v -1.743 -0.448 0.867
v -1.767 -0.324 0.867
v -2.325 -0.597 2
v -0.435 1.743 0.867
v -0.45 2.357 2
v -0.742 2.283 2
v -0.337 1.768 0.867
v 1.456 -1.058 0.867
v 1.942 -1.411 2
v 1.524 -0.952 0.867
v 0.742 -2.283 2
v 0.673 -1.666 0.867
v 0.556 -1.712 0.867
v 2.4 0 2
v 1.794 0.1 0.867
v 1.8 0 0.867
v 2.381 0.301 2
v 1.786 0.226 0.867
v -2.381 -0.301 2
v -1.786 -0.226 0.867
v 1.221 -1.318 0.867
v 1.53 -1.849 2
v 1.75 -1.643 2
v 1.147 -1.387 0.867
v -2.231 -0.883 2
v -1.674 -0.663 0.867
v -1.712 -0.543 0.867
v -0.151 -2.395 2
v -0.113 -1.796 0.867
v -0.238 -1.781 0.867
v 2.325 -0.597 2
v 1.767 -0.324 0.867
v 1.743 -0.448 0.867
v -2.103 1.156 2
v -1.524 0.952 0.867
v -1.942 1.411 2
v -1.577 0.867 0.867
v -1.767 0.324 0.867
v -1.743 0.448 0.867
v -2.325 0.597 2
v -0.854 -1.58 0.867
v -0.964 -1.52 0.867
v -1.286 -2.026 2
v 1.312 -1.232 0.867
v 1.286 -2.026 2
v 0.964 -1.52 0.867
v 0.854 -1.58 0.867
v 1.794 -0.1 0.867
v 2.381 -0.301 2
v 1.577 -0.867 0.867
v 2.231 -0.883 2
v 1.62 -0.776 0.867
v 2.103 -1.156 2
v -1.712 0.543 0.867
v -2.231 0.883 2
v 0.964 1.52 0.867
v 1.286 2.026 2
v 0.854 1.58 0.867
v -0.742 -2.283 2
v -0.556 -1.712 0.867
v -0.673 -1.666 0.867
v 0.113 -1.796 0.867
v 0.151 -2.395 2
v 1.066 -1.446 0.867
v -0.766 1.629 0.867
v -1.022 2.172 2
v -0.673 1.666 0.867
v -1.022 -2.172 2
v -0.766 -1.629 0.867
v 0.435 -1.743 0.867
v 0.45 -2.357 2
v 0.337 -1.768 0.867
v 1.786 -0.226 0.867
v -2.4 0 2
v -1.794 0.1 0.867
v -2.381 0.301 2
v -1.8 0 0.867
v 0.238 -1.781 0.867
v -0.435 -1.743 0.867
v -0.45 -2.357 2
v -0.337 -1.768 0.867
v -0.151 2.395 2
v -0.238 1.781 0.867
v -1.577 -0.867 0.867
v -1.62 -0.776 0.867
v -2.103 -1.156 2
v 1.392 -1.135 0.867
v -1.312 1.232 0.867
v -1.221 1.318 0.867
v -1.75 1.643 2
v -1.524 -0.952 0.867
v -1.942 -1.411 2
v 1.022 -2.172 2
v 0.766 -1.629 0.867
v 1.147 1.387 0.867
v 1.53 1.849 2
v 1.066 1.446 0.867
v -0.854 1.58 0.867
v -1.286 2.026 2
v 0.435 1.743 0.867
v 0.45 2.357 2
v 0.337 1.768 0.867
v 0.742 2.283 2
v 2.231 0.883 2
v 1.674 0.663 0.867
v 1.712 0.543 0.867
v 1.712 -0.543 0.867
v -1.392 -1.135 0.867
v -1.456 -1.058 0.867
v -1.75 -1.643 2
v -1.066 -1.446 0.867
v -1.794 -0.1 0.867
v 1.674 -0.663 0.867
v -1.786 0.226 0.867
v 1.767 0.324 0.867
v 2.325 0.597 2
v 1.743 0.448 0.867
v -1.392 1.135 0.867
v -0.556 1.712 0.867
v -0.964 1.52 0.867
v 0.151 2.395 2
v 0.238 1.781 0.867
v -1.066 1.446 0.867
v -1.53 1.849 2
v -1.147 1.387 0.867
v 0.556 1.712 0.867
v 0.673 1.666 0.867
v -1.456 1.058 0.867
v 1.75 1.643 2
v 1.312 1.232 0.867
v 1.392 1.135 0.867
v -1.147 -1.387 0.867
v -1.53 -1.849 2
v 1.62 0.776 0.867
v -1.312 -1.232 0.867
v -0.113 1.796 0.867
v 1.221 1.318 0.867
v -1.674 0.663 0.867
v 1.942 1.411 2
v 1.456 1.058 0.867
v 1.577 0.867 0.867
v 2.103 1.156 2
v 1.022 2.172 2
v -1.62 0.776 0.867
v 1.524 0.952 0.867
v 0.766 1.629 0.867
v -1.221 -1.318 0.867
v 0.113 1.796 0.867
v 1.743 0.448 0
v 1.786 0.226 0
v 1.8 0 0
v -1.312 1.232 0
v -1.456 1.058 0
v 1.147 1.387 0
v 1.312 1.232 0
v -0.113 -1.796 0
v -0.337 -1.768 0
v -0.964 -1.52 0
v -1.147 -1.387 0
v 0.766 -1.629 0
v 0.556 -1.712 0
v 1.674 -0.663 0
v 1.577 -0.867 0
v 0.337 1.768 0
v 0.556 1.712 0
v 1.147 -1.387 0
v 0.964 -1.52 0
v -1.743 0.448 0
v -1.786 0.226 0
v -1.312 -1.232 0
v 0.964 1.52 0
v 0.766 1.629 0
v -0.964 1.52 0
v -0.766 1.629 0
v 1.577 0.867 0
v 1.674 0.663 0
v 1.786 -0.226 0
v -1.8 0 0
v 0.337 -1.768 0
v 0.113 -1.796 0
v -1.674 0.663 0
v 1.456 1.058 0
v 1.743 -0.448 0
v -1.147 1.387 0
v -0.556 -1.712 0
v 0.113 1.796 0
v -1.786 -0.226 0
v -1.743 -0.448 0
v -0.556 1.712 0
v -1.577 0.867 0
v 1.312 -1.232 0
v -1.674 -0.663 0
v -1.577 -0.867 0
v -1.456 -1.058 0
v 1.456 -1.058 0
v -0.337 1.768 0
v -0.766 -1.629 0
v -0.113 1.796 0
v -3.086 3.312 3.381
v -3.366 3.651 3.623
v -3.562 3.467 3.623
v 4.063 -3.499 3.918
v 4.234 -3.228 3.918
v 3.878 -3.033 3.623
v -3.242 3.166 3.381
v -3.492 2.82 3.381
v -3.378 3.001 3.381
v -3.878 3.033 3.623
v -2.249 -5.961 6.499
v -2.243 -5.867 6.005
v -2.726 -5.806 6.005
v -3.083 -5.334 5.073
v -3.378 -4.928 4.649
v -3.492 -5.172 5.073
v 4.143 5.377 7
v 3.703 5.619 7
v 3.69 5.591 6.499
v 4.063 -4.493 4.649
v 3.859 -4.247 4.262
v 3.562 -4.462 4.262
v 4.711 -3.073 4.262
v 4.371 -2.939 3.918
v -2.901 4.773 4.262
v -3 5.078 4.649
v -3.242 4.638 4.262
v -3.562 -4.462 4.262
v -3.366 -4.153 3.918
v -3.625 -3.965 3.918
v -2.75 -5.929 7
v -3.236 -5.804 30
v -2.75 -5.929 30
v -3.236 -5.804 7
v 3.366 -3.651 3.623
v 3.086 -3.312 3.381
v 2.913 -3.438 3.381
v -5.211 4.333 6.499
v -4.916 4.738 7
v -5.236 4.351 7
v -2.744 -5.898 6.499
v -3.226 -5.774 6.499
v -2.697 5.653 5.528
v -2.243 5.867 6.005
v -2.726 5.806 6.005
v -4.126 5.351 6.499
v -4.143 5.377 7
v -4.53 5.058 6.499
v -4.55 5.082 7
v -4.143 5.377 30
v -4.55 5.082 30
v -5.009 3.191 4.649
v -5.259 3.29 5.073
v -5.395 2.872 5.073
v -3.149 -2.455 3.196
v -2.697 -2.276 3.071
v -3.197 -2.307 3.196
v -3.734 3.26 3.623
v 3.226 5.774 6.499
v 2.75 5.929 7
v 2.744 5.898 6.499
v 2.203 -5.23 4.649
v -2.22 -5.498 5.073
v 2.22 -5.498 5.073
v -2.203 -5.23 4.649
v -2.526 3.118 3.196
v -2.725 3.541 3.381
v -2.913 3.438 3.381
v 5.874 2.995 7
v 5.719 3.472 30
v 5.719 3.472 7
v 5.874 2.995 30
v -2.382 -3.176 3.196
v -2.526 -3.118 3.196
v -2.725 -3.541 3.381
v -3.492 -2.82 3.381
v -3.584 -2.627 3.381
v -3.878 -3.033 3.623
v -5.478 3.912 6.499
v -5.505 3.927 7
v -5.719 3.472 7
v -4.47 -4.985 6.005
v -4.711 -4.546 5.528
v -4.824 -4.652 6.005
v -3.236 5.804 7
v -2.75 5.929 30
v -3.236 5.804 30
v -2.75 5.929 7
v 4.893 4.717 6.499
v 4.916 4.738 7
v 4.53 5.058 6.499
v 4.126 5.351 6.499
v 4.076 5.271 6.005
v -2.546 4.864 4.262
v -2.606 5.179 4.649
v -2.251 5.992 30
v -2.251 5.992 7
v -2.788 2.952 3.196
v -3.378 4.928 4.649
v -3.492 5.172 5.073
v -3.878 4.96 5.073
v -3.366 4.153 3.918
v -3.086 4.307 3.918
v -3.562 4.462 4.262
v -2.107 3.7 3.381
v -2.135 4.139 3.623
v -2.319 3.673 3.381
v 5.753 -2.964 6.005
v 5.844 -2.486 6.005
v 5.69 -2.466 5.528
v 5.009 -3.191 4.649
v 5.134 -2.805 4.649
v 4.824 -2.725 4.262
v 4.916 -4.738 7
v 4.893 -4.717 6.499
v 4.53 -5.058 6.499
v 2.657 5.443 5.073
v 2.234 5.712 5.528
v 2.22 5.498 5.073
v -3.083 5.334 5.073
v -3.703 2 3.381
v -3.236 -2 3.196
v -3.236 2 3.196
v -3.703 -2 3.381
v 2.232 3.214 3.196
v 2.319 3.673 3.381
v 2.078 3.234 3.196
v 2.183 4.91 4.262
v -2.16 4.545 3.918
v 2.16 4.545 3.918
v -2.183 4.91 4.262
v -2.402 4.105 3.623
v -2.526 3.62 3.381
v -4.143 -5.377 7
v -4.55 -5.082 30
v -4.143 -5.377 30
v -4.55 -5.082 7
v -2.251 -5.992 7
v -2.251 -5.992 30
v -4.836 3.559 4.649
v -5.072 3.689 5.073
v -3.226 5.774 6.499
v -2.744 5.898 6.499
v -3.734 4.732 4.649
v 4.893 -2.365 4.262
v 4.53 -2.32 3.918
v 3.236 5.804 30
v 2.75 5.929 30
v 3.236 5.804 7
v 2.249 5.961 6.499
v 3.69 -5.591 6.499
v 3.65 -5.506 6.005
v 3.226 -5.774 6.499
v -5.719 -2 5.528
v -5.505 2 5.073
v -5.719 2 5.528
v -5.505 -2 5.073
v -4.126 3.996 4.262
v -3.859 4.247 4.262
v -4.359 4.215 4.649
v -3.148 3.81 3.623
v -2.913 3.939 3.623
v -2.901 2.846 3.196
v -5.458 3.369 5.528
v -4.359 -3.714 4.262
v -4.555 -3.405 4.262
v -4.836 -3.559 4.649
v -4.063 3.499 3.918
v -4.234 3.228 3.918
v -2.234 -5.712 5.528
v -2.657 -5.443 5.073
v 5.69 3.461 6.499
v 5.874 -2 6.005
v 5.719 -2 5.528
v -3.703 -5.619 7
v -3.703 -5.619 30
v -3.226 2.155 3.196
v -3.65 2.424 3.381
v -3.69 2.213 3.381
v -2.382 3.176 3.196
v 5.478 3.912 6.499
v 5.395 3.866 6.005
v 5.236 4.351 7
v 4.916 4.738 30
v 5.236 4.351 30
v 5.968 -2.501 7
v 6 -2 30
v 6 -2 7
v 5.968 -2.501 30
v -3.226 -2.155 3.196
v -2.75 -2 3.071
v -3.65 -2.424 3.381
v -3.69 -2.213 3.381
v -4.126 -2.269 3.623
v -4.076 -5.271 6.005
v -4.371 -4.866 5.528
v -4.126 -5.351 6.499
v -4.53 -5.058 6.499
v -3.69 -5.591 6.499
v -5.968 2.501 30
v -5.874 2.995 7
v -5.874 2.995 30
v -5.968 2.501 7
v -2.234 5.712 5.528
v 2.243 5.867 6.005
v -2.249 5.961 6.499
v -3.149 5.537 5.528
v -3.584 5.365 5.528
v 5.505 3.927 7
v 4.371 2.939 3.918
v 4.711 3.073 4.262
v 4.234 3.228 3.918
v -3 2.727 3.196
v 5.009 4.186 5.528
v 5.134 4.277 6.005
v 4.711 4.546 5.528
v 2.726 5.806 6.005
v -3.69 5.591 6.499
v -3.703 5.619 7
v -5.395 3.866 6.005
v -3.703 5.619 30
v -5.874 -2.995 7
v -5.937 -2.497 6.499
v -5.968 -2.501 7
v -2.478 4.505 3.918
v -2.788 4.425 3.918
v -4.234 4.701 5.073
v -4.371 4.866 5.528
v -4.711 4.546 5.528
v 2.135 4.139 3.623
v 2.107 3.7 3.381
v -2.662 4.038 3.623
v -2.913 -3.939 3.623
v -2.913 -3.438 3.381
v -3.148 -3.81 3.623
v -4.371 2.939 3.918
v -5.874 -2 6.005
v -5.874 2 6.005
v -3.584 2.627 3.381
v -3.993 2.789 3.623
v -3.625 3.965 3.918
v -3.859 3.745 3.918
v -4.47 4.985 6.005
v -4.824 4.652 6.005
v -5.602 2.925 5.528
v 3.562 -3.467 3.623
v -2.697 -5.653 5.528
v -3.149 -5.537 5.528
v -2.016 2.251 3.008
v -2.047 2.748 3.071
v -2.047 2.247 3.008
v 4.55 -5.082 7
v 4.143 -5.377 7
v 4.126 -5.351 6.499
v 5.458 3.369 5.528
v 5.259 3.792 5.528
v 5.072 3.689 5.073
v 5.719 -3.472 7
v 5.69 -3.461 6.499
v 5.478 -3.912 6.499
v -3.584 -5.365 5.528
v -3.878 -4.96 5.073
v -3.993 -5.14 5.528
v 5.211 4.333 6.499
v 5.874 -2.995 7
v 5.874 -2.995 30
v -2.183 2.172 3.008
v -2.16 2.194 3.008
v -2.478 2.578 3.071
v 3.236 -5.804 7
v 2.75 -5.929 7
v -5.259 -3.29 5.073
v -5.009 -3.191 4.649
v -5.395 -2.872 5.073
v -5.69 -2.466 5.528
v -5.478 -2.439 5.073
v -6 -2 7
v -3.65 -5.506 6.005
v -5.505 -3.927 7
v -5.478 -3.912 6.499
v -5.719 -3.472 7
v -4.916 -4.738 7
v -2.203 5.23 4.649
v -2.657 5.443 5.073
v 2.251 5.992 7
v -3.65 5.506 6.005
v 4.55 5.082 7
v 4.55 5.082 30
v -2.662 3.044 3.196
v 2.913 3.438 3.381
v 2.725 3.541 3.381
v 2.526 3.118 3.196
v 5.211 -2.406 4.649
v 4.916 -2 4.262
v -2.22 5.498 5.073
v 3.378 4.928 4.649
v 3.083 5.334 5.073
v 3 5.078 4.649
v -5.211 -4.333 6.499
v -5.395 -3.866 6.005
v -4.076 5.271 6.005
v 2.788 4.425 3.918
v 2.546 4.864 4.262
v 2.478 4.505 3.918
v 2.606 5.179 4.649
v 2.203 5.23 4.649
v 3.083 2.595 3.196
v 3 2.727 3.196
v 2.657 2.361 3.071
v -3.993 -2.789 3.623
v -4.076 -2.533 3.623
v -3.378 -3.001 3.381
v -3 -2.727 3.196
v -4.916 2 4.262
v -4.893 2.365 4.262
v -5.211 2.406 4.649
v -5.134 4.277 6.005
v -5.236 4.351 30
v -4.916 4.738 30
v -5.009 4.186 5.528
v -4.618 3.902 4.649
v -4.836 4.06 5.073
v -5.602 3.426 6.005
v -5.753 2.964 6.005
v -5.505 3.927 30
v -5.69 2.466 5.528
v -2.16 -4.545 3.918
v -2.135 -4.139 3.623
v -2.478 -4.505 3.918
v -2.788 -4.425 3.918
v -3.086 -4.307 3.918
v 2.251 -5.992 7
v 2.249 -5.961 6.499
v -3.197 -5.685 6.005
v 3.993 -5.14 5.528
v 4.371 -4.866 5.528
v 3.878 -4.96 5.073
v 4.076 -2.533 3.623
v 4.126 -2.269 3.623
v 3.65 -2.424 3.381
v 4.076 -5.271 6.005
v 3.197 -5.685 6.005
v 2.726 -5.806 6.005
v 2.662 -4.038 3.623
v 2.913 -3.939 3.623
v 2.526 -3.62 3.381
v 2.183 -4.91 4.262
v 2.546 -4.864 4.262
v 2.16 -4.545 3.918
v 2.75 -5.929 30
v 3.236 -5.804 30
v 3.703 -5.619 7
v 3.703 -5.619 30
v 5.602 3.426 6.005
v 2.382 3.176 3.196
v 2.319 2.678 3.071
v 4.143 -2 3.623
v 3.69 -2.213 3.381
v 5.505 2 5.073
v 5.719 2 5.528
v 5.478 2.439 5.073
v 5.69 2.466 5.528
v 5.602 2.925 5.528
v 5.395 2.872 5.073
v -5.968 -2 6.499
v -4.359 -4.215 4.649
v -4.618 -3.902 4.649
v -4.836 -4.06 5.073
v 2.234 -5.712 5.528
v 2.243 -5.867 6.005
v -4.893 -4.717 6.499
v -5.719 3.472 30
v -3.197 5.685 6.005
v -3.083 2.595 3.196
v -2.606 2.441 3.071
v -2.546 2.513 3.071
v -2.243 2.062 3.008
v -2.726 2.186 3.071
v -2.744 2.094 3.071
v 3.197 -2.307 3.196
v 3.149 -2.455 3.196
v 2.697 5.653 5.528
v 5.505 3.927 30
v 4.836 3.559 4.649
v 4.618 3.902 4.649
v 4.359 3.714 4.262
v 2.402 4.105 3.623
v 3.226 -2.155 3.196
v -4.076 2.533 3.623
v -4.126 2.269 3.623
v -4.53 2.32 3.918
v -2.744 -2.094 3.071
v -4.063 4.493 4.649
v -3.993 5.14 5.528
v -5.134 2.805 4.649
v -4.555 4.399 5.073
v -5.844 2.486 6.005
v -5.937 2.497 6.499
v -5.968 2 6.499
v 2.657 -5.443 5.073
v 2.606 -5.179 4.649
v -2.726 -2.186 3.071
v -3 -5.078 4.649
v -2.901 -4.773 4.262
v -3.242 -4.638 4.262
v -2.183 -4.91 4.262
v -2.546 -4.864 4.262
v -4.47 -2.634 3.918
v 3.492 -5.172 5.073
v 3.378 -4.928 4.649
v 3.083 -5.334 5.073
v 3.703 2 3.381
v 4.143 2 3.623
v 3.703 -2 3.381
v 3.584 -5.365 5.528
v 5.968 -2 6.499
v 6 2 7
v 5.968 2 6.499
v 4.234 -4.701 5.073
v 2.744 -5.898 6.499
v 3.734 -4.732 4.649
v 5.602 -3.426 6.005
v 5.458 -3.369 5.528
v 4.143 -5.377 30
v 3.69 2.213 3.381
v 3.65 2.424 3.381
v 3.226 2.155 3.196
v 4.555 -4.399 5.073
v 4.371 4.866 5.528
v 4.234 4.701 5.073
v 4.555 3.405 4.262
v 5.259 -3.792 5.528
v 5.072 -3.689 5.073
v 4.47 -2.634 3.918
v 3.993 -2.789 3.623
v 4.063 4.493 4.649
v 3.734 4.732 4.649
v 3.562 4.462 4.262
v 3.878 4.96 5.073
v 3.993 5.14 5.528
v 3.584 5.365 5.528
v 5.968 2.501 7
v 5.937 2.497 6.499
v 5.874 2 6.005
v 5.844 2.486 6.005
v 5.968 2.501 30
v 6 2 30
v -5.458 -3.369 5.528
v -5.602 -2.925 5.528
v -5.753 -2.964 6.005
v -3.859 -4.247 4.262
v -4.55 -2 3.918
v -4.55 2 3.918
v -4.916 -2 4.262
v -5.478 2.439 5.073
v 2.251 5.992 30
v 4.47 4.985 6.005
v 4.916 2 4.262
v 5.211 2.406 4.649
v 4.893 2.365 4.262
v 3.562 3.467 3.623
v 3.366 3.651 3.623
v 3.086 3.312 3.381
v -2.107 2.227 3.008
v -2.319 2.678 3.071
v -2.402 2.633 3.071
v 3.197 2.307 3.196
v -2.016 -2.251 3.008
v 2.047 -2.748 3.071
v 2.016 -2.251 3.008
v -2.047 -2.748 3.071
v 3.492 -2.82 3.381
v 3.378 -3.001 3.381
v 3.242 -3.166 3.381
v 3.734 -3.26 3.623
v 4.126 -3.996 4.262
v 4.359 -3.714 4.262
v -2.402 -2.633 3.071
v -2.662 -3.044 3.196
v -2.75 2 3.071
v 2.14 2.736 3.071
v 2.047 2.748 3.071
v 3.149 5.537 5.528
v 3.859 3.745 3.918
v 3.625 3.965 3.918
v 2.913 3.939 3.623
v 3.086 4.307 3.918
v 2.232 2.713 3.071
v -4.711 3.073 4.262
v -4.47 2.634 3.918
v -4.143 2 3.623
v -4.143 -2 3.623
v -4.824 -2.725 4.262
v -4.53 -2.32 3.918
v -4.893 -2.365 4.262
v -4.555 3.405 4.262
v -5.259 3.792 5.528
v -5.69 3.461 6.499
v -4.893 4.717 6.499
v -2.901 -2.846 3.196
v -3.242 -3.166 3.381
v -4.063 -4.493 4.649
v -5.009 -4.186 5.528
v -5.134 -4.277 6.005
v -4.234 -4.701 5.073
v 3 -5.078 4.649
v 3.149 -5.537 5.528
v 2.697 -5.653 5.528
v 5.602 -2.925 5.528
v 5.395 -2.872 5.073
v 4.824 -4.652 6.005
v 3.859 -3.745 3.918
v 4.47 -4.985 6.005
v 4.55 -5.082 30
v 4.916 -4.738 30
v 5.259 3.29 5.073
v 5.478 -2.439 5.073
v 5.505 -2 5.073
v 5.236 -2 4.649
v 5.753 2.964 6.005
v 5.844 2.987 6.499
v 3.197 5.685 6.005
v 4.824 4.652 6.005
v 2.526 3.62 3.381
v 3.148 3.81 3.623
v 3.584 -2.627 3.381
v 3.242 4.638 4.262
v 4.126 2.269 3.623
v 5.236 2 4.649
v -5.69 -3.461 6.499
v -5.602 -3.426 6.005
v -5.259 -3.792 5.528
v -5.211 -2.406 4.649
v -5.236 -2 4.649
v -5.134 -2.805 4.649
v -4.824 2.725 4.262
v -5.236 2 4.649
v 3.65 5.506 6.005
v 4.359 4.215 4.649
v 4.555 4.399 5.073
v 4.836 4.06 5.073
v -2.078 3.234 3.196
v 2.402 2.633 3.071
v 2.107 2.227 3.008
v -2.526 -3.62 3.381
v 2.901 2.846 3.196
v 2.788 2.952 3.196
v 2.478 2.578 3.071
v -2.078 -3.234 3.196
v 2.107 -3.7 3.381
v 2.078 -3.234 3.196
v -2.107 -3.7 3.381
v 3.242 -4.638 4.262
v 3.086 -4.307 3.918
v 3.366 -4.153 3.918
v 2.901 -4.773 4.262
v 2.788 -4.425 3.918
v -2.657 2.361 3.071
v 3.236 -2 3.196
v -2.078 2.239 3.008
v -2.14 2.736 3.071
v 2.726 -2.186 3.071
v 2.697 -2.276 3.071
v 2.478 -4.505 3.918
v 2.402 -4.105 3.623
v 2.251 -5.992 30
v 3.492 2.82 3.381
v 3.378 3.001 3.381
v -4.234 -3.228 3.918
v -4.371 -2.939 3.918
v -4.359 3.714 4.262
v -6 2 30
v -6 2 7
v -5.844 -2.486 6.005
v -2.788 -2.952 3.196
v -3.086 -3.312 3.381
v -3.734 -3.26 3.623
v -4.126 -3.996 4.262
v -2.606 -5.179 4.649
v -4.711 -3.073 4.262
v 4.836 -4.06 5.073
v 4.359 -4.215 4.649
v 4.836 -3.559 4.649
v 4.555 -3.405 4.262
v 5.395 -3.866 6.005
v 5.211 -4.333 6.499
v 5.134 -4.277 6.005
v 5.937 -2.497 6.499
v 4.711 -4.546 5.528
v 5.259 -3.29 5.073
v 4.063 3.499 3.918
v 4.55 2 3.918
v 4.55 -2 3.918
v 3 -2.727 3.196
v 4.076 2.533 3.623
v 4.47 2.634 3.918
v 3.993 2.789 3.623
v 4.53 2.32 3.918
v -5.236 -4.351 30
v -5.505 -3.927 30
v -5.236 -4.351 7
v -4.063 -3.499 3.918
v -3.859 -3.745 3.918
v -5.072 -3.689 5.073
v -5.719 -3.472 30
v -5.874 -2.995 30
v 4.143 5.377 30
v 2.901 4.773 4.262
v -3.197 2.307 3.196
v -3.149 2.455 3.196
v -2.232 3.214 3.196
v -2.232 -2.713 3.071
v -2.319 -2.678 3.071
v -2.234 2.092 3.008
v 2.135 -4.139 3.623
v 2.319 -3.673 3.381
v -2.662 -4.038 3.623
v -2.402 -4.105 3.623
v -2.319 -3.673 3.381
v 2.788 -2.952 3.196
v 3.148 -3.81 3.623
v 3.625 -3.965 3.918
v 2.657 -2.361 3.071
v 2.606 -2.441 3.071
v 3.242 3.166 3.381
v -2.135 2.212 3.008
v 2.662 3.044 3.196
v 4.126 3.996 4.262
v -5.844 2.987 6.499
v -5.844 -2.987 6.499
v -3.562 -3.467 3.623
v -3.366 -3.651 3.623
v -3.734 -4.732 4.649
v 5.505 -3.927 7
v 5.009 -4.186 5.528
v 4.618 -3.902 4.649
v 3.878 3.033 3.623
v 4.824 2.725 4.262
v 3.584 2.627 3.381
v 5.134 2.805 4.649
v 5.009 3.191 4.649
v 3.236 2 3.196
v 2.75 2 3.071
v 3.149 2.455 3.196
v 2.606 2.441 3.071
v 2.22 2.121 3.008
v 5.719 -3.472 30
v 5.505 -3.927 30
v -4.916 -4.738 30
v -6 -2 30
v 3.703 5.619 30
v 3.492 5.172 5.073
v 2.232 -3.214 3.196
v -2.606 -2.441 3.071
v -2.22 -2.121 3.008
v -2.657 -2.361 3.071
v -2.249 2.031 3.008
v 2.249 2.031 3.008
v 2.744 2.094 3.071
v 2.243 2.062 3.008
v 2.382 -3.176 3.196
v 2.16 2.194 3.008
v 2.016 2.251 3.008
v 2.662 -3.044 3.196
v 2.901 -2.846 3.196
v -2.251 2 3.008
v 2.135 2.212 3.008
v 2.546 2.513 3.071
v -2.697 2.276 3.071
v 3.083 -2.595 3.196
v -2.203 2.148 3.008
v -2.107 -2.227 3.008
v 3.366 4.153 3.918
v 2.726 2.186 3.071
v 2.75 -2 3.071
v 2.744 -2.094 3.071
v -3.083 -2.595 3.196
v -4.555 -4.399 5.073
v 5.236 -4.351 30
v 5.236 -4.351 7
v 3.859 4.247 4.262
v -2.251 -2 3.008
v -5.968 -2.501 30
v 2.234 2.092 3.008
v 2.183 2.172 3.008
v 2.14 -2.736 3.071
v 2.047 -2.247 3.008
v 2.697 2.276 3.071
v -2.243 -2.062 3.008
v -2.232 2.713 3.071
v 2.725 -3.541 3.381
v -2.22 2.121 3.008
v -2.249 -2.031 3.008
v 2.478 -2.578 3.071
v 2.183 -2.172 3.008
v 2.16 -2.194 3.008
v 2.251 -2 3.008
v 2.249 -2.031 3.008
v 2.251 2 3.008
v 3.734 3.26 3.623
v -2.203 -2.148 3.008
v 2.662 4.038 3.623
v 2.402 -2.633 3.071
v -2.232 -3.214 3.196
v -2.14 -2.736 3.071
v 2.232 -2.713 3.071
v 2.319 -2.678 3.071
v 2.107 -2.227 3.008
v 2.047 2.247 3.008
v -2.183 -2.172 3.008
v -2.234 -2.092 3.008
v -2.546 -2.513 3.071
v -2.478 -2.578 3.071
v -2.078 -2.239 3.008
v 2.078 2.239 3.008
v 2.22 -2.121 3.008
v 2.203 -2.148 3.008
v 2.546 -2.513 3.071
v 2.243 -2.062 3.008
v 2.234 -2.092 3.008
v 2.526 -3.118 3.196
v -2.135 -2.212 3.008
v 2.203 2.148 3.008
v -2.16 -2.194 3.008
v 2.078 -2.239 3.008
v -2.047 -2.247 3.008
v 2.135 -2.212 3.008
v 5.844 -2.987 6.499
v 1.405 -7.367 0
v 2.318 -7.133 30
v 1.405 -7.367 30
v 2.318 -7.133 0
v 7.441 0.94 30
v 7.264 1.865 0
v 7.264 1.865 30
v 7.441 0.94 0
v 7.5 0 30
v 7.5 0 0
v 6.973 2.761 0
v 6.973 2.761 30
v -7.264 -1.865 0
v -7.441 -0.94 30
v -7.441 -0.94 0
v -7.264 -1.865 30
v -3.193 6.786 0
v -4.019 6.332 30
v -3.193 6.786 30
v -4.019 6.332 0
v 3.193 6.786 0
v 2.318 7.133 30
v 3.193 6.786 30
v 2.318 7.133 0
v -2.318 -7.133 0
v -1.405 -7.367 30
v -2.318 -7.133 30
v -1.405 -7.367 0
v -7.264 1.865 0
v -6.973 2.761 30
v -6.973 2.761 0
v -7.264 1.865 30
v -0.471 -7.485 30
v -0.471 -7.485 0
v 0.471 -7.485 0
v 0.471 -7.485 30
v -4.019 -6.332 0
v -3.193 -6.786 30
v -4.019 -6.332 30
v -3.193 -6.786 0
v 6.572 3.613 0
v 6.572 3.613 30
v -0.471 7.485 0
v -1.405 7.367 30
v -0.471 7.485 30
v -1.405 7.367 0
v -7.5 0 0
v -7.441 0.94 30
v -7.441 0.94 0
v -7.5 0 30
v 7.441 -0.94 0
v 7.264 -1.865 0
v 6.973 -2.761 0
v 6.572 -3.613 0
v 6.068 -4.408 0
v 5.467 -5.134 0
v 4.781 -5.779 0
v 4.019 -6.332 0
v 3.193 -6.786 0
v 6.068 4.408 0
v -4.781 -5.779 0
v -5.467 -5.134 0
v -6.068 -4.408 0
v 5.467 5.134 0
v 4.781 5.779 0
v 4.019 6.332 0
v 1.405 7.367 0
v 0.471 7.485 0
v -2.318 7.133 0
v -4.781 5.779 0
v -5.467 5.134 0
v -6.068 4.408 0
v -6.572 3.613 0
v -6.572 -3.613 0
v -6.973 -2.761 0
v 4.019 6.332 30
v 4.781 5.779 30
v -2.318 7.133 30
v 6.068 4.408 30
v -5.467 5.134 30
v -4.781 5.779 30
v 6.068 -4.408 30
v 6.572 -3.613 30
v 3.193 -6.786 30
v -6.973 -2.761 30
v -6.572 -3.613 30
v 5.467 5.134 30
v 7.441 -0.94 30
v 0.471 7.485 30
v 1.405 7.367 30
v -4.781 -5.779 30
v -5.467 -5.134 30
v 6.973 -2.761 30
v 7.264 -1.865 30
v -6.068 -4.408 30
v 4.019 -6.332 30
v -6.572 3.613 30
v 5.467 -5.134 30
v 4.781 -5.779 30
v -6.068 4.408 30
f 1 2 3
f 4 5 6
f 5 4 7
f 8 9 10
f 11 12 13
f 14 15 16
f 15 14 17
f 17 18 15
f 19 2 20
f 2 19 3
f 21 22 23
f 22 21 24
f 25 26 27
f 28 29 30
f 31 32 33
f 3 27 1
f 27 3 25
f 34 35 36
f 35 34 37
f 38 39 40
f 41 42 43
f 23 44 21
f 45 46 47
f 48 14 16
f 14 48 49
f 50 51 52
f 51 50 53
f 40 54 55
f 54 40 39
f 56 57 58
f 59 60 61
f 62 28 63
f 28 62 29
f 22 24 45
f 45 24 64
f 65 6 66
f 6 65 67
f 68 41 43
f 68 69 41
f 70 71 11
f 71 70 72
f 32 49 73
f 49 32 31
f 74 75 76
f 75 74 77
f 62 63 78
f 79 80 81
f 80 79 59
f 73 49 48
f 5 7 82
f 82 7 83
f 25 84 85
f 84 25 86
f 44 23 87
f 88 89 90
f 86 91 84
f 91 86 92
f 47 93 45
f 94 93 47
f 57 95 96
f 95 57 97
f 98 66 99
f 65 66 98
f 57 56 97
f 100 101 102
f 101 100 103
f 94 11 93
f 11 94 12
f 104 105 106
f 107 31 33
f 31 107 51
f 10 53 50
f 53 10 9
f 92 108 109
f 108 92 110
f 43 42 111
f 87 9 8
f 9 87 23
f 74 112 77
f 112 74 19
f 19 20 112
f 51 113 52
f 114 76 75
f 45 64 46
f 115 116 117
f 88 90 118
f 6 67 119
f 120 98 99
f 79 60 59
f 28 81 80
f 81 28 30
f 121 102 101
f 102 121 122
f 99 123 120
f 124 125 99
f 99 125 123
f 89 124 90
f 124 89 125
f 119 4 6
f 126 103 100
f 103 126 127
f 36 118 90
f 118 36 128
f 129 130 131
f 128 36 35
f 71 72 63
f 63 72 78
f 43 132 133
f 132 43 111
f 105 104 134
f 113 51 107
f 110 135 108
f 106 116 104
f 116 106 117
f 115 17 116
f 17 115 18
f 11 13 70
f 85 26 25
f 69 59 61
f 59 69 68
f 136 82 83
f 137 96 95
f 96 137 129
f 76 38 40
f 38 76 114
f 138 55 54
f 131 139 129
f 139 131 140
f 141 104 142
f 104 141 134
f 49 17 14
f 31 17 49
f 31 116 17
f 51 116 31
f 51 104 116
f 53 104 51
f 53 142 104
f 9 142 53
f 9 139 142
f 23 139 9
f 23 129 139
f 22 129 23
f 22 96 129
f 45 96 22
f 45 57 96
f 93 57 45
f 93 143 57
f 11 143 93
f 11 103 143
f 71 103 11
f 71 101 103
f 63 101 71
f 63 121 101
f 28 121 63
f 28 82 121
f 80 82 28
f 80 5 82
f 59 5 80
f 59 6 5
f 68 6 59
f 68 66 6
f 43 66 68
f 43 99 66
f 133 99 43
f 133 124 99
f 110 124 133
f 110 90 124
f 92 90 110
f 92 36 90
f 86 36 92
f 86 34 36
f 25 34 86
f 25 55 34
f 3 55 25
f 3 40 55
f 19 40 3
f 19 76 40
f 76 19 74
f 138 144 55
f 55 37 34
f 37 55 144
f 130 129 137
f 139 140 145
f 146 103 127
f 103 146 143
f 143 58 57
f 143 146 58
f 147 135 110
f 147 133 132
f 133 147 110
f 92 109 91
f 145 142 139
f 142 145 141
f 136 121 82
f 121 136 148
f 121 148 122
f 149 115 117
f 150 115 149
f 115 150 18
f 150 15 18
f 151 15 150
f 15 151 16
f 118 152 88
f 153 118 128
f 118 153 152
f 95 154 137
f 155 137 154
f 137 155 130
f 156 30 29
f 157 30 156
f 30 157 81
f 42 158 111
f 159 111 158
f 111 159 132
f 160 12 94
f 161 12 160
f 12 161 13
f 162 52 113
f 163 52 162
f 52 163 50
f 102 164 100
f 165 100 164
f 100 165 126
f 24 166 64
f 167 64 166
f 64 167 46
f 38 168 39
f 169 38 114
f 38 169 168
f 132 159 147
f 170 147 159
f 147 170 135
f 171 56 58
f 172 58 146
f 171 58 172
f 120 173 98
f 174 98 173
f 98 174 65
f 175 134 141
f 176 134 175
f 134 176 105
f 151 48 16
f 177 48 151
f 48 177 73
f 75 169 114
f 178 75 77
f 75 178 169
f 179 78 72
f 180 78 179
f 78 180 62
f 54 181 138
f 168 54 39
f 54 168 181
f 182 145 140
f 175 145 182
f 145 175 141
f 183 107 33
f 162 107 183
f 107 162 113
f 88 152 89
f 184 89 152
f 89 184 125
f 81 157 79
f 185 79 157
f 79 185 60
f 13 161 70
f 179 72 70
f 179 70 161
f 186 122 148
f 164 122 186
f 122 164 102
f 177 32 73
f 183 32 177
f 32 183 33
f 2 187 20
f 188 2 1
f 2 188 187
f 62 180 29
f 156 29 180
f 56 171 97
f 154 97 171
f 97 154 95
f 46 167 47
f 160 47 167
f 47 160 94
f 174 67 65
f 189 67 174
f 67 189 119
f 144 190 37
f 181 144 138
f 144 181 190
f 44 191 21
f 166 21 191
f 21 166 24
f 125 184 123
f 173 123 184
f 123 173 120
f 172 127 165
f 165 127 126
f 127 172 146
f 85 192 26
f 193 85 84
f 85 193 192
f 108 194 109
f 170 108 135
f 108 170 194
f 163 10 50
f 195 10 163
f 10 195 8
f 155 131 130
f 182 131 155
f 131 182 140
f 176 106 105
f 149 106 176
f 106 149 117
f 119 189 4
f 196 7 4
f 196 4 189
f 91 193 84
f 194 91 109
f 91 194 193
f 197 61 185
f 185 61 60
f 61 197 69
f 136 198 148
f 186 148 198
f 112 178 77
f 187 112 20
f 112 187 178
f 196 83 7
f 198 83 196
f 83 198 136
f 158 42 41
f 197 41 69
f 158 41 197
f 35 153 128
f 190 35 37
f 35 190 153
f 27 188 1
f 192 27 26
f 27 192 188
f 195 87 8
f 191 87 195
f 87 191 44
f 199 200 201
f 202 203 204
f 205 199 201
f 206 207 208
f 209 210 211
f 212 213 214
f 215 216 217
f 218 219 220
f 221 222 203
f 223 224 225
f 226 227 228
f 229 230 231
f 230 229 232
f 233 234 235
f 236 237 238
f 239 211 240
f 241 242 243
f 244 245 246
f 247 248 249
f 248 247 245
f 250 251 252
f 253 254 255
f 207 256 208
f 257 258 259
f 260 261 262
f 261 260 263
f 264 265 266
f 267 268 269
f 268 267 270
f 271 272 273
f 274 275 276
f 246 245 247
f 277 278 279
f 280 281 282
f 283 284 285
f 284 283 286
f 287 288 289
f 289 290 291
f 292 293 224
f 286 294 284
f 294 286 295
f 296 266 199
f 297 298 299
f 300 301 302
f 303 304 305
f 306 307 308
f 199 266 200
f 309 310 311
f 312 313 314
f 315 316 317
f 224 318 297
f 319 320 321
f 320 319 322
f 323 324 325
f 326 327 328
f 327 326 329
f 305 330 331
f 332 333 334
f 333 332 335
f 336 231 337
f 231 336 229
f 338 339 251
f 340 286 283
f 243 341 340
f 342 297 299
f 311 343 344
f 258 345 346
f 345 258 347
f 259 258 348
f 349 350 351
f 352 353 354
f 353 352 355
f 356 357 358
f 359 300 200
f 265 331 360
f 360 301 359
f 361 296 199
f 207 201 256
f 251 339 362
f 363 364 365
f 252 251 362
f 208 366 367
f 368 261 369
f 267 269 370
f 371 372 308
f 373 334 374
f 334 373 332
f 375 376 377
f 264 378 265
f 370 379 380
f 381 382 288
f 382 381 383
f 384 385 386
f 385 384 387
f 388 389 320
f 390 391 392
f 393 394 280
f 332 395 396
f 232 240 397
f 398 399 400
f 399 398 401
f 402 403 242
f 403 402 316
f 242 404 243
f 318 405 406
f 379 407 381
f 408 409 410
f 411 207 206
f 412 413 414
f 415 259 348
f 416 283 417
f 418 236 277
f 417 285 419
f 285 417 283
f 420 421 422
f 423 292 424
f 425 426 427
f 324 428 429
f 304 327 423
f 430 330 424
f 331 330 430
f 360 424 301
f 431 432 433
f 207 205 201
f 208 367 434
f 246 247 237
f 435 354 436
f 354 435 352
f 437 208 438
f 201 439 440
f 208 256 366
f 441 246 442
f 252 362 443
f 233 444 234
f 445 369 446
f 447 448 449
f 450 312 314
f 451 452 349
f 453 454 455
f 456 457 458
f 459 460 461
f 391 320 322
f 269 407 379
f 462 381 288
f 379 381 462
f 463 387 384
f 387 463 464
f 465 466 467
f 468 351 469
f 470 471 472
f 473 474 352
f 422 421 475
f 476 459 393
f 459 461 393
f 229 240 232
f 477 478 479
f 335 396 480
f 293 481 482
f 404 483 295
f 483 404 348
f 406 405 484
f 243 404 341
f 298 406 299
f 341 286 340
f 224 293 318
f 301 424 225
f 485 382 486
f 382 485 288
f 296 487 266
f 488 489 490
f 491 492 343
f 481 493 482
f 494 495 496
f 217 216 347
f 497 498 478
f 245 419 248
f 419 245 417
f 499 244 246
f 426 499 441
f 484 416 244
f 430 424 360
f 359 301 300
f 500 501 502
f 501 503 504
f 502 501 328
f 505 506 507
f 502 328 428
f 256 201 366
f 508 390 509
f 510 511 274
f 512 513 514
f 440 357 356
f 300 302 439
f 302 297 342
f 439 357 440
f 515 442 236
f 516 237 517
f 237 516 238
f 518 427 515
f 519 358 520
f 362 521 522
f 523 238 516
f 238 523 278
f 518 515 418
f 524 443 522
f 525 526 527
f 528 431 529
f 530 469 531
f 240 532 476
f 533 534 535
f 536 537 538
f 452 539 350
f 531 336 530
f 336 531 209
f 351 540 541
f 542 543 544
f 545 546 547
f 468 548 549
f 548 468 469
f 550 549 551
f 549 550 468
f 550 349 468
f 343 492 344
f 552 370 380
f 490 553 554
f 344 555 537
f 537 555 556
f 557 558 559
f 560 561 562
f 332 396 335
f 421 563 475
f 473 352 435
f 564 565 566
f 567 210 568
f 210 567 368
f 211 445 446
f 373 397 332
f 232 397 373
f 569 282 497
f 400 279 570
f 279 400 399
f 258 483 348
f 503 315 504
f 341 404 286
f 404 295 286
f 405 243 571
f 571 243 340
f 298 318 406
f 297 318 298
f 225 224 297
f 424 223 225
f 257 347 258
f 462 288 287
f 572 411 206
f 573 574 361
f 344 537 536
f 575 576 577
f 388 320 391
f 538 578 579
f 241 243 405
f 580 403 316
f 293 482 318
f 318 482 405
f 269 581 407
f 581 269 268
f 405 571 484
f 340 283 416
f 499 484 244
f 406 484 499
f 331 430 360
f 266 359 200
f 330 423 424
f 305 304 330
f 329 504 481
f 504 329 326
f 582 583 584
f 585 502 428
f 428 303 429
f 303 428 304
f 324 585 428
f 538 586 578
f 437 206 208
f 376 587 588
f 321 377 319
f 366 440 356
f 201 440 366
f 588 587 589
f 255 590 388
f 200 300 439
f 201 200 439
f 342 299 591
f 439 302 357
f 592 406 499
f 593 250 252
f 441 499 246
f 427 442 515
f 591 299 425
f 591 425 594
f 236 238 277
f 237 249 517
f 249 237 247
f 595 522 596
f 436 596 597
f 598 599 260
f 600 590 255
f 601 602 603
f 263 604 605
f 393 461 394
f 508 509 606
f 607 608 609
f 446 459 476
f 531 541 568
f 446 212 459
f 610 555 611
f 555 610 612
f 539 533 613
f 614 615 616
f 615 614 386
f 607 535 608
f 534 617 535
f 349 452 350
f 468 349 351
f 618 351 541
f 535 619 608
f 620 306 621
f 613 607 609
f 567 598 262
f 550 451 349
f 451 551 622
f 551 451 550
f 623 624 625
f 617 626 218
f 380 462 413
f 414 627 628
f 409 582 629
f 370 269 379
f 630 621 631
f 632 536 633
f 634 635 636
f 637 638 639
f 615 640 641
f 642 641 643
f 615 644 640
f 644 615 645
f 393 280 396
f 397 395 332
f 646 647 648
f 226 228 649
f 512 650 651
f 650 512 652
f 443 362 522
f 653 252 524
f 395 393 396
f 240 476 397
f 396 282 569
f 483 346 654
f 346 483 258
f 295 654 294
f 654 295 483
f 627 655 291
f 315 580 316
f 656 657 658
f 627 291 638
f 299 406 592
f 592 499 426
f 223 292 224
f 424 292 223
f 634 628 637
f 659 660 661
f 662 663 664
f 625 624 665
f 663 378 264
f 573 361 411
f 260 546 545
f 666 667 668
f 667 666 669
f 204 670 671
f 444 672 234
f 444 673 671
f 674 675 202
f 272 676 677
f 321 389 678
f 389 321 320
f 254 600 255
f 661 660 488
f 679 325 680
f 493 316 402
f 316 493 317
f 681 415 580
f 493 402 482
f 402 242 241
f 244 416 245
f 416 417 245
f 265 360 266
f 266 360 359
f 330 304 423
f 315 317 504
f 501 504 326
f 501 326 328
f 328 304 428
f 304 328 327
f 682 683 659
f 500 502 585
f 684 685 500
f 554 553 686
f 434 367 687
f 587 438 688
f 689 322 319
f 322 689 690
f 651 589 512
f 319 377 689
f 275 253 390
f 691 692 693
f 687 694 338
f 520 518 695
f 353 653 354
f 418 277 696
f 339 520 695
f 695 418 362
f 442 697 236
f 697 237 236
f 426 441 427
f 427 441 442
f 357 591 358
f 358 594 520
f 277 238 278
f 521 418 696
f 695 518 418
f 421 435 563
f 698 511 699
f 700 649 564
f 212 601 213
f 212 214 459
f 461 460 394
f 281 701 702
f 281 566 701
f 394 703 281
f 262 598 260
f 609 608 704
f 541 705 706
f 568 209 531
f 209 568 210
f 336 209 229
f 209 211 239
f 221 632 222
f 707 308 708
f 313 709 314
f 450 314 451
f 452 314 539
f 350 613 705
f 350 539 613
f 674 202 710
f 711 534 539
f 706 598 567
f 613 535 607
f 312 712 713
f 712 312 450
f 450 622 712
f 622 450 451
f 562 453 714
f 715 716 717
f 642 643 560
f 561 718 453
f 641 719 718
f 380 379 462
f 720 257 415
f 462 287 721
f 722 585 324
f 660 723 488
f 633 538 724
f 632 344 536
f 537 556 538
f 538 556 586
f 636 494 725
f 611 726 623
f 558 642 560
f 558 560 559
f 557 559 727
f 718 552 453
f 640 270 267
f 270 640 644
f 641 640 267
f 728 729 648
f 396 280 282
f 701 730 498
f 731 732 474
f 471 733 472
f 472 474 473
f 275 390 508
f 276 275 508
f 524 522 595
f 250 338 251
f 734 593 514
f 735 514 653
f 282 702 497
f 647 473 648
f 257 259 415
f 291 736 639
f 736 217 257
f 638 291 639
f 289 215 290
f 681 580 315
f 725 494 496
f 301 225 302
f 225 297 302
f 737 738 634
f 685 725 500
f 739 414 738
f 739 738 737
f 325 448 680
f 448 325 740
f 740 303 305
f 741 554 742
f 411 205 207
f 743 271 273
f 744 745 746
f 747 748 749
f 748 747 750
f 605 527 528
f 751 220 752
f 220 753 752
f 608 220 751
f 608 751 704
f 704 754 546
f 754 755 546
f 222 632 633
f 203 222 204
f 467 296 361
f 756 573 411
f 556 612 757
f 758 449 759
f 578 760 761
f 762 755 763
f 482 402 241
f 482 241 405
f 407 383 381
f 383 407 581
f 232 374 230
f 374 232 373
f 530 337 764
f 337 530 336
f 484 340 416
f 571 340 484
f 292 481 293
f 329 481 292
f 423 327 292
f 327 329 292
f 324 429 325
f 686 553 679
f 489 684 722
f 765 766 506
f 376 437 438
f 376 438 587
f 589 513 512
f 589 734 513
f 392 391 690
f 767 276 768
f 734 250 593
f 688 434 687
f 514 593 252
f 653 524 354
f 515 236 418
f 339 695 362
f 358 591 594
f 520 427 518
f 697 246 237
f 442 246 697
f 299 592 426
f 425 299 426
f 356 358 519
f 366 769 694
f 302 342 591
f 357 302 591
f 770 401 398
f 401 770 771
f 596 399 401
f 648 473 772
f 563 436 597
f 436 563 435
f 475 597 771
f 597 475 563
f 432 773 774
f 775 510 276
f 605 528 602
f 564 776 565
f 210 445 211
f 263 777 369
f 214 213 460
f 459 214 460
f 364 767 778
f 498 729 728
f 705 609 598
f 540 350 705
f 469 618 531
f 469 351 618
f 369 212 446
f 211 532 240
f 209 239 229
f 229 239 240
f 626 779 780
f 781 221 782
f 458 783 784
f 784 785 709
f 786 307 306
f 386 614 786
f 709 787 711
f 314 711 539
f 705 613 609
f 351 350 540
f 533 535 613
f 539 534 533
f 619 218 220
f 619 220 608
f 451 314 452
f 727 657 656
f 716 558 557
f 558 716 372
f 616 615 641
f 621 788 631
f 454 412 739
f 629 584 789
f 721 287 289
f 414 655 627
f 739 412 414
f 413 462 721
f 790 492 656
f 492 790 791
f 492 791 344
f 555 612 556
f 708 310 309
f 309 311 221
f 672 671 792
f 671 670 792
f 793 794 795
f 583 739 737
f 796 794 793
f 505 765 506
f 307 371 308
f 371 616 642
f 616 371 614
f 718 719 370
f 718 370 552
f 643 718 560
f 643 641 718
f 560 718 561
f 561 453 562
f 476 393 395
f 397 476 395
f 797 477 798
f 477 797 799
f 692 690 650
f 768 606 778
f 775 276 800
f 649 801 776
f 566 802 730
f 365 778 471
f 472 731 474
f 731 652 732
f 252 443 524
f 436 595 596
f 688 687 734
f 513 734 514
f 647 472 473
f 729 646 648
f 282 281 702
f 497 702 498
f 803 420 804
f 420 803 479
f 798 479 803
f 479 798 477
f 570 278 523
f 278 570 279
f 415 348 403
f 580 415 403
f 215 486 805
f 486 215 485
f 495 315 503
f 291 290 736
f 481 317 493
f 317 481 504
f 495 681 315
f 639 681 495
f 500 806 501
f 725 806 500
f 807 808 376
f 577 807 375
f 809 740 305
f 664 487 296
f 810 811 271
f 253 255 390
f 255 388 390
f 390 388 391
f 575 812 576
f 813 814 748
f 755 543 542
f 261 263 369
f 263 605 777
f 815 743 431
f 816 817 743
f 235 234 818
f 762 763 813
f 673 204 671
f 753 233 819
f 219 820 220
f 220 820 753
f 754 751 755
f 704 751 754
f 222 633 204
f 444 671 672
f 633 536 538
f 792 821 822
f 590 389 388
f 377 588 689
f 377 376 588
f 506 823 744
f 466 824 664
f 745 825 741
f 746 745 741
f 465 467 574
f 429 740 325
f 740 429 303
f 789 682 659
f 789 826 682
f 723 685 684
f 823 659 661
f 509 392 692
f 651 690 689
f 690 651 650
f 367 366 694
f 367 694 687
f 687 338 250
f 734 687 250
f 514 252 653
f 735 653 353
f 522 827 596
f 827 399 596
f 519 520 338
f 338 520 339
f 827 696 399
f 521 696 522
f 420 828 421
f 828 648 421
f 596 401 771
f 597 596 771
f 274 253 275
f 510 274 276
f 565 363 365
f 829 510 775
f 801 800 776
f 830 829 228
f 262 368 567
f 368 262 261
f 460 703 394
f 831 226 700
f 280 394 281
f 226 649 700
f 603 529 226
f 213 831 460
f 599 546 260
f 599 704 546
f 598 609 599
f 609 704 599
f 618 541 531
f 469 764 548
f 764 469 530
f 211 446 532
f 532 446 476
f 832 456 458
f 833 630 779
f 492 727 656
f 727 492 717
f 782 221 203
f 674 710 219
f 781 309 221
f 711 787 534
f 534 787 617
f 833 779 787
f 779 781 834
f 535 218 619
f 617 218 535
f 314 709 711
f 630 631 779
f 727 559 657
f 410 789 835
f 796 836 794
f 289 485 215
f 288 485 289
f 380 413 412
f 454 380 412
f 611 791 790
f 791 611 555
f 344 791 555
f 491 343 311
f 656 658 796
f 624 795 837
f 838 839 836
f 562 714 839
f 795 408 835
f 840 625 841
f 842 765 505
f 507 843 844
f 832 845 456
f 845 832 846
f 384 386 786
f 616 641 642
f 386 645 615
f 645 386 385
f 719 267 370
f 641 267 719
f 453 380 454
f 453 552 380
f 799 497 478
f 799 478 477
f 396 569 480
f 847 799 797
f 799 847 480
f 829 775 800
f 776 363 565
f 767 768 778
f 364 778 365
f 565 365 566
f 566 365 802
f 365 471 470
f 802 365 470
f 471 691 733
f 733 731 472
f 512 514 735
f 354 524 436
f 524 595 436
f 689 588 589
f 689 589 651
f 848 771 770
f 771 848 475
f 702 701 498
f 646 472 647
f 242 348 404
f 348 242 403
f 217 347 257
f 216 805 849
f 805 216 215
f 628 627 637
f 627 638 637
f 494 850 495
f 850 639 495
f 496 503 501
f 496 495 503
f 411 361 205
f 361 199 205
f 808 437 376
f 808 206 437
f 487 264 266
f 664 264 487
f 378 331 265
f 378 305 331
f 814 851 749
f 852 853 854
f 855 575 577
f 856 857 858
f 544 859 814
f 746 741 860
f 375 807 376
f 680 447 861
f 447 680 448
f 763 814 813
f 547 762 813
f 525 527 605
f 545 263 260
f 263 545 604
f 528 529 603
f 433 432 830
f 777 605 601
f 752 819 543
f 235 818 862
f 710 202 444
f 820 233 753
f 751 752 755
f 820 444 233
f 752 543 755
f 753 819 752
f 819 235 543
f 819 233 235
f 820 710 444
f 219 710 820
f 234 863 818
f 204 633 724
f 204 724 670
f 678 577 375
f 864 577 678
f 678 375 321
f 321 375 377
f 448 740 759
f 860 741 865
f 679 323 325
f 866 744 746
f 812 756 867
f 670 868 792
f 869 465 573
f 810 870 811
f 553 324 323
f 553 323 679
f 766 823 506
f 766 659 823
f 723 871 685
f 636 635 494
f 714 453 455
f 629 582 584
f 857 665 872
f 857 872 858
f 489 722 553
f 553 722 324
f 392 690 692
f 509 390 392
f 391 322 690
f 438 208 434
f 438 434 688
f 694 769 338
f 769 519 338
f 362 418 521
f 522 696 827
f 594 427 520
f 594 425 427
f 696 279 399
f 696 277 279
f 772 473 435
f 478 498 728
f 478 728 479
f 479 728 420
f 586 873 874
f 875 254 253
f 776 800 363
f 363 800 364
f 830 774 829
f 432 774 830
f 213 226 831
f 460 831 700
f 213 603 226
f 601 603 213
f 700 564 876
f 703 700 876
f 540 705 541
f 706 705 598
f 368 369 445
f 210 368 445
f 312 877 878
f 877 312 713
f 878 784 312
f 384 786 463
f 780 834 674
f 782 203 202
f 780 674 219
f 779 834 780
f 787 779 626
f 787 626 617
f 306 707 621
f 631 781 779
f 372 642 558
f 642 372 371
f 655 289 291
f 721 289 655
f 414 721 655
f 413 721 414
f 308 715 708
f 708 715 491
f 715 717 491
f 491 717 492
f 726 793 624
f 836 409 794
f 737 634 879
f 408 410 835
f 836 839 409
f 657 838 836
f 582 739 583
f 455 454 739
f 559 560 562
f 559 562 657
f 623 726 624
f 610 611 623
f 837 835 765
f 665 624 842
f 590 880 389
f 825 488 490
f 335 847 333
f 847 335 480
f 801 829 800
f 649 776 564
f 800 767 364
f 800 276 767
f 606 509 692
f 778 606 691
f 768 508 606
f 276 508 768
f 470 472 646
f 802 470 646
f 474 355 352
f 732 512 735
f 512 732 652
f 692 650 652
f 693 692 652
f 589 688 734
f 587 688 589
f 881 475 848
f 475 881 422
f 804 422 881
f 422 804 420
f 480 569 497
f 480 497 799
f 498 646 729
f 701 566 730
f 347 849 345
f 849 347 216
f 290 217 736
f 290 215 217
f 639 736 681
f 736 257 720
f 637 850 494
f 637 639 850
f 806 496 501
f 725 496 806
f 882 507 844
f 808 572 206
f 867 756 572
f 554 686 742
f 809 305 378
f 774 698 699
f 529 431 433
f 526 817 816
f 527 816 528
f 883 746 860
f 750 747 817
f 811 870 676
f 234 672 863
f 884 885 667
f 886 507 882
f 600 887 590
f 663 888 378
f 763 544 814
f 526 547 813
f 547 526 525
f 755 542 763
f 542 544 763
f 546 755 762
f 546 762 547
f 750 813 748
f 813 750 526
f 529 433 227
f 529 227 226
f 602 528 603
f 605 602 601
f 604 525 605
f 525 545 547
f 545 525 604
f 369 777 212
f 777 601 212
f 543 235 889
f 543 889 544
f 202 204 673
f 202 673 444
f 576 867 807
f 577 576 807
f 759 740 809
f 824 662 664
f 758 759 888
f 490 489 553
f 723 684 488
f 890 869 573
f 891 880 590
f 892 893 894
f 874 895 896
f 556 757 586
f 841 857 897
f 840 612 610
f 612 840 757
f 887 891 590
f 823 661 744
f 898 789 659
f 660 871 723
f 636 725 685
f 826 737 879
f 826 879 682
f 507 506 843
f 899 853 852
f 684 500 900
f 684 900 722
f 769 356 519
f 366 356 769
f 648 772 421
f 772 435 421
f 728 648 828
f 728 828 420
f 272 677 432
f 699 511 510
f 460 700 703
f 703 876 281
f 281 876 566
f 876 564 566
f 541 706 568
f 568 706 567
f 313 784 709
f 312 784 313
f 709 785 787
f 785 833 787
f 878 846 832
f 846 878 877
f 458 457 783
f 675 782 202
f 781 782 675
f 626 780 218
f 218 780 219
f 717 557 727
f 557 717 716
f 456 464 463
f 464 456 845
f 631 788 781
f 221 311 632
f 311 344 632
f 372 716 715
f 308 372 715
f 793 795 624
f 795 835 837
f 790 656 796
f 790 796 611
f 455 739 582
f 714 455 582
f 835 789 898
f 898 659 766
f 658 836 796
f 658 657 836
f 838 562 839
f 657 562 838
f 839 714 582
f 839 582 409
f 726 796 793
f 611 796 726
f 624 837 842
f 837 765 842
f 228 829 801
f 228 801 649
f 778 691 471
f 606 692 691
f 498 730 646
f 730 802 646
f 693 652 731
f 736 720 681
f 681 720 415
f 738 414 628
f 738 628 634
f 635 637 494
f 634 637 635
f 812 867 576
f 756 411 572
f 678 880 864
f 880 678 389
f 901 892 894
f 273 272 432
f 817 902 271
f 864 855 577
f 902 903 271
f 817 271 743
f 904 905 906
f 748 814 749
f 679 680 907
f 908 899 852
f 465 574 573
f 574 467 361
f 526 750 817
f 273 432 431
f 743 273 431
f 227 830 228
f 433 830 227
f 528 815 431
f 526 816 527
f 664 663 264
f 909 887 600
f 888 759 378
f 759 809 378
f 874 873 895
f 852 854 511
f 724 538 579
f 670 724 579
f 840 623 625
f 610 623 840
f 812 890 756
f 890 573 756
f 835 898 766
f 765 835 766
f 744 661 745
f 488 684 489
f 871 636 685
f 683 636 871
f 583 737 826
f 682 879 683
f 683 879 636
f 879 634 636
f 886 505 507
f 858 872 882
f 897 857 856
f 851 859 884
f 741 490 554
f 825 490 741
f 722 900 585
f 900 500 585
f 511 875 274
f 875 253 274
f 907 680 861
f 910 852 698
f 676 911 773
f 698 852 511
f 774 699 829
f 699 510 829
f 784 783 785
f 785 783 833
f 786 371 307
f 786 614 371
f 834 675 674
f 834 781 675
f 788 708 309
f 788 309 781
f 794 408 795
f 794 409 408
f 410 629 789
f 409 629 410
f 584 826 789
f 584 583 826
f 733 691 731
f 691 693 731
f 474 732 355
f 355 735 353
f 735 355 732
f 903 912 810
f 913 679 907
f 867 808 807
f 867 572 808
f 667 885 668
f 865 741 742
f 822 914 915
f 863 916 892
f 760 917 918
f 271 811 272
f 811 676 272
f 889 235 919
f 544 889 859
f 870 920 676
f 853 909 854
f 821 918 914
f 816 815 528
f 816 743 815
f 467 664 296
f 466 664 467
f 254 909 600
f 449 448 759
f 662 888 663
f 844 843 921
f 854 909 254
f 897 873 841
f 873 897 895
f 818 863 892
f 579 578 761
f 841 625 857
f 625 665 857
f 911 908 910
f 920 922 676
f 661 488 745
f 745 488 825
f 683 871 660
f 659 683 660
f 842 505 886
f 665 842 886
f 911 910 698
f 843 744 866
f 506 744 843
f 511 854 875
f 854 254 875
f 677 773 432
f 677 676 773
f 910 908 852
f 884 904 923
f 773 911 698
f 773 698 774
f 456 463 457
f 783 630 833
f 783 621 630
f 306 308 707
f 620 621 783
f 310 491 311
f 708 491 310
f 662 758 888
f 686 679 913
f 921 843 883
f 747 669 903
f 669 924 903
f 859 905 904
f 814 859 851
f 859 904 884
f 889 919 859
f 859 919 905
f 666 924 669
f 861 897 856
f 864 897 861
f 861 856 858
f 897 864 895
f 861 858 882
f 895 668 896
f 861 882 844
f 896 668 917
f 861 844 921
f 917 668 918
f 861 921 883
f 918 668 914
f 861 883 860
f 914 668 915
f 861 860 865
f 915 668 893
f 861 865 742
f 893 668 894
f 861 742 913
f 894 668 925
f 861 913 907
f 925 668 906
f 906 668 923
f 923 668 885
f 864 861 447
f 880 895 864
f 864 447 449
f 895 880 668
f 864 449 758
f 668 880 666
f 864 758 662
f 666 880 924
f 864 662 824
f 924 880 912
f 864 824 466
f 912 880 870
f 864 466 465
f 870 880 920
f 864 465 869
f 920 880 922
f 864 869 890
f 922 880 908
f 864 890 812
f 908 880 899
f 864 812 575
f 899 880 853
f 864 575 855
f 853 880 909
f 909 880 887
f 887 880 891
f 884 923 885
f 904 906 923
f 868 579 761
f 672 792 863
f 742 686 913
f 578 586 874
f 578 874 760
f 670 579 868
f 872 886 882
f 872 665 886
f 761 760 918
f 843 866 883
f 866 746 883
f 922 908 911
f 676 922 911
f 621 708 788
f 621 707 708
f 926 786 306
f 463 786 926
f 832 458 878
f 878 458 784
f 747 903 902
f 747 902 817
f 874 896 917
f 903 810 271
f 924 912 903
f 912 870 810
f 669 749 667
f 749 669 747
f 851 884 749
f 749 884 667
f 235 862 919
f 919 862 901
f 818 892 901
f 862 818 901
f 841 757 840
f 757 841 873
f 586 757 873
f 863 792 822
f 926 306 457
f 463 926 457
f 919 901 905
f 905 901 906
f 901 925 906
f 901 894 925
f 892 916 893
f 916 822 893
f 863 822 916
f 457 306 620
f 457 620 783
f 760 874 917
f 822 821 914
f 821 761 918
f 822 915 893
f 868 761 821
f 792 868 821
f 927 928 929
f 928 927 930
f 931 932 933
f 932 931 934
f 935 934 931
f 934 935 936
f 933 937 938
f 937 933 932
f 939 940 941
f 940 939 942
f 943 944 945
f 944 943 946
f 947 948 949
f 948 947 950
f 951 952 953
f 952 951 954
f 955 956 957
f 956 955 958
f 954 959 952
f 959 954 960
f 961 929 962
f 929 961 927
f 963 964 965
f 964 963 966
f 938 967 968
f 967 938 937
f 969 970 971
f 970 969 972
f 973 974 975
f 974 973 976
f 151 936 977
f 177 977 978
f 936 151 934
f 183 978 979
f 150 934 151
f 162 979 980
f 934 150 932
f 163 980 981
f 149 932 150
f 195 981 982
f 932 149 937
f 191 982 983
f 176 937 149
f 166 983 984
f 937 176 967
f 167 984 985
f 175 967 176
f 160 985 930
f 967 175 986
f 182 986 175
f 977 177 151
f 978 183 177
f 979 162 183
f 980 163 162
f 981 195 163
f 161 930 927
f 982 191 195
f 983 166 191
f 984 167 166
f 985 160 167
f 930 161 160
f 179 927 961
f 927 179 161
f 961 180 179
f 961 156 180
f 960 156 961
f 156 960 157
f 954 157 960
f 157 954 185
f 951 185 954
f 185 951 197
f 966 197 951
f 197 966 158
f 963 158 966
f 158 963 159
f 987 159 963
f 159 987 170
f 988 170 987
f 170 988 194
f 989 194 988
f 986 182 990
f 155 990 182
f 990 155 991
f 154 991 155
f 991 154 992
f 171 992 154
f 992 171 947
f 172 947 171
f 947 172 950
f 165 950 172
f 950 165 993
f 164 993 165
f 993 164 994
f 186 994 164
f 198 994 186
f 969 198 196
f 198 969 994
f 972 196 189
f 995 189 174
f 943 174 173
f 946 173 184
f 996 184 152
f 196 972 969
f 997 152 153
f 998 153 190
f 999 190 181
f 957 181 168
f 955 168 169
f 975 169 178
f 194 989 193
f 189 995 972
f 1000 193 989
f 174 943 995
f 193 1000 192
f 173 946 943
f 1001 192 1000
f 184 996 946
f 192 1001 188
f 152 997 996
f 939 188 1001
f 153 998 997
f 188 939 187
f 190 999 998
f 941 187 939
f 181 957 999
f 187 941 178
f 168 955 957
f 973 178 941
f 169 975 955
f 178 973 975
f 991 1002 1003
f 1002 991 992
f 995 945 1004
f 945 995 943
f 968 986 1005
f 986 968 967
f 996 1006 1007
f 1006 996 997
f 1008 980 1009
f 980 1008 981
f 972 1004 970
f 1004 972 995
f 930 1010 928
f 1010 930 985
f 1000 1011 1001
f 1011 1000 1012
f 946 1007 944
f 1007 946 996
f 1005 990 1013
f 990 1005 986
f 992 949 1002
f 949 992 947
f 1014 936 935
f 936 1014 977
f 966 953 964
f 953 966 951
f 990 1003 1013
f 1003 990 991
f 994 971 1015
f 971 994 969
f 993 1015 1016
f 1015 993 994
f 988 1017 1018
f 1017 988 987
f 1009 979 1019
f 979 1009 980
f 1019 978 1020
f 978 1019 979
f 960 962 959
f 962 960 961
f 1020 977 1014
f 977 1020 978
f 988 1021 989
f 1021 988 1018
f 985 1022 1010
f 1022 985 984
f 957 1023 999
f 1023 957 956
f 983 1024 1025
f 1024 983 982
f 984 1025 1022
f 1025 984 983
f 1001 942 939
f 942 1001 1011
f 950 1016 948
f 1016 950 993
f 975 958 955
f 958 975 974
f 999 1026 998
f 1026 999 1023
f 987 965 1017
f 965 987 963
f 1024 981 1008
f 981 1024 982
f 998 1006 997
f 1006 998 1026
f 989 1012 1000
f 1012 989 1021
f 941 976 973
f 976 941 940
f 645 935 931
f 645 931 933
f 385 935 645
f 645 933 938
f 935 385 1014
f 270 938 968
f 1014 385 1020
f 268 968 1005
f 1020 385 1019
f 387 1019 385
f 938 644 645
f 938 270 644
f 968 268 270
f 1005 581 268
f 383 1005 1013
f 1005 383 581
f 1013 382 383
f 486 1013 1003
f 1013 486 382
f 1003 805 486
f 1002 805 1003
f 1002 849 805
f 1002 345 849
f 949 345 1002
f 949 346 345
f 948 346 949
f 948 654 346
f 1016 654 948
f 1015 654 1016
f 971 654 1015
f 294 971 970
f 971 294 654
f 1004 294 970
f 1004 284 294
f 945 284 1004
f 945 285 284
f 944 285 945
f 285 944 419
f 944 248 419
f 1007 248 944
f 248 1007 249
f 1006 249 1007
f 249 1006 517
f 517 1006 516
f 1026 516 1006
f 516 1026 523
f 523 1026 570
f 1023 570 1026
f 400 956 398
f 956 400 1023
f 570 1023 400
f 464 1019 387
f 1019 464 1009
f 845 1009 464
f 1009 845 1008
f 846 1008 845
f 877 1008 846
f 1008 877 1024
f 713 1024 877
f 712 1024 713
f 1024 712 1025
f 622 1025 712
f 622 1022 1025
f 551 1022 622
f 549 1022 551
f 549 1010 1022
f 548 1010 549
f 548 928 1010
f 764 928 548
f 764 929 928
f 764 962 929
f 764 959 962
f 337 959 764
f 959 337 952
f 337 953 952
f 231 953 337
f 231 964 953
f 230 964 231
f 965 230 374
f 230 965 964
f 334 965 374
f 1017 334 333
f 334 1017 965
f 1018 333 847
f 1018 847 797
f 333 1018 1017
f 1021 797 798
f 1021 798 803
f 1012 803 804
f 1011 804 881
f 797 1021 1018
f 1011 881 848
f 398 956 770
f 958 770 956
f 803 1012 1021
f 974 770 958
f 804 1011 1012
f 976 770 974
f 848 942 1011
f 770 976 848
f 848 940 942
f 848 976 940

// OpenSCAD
$fn = 50;


difference() {
	union() {
		cylinder(h = 30, r = 7.5000000000);
	}
	union() {
		translate(v = [0.0000000000, 0.0000000000, 2]) {
			rotate(a = [0, 0, 0]) {
				difference() {
					union() {
						translate(v = [0, 0, -1.7000000000]) {
							cylinder(h = 1.7000000000, r1 = 1.5000000000, r2 = 2.4000000000);
						}
						translate(v = [0, 0, -6.0000000000]) {
							cylinder(h = 6, r = 1.5000000000);
						}
						translate(v = [0, 0, -6.0000000000]) {
							cylinder(h = 6, r = 1.8000000000);
						}
						translate(v = [0, 0, -6.0000000000]) {
							cylinder(h = 6, r = 1.5000000000);
						}
					}
					union();
				}
			}
		}
		translate(v = [0.0000000000, 0.0000000000, 2]) {
			rotate(a = [0, 0, 0]) {
				difference() {
					union() {
						translate(v = [0, 0, -1.7000000000]) {
							cylinder(h = 1.7000000000, r1 = 1.5000000000, r2 = 2.4000000000);
						}
						translate(v = [0, 0, -6.0000000000]) {
							cylinder(h = 6, r = 1.5000000000);
						}
						translate(v = [0, 0, -6.0000000000]) {
							cylinder(h = 6, r = 1.8000000000);
						}
						translate(v = [0, 0, -6.0000000000]) {
							cylinder(h = 6, r = 1.5000000000);
						}
					}
					union();
				}
			}
		}
		translate(v = [0.0000000000, 0.0000000000, 2]) {
			rotate(a = [0, 0, 0]) {
				difference() {
					union() {
						translate(v = [0, 0, -1.7000000000]) {
							cylinder(h = 1.7000000000, r1 = 1.5000000000, r2 = 2.4000000000);
						}
						translate(v = [0, 0, -6.0000000000]) {
							cylinder(h = 6, r = 1.5000000000);
						}
						translate(v = [0, 0, -6.0000000000]) {
							cylinder(h = 6, r = 1.8000000000);
						}
						translate(v = [0, 0, -6.0000000000]) {
							cylinder(h = 6, r = 1.5000000000);
						}
					}
					union();
				}
			}
		}
		translate(v = [0.0000000000, 0.0000000000, 2]) {
			rotate(a = [0, 0, 0]) {
				difference() {
					union() {
						translate(v = [0, 0, -1.7000000000]) {
							cylinder(h = 1.7000000000, r1 = 1.5000000000, r2 = 2.4000000000);
						}
						translate(v = [0, 0, -6.0000000000]) {
							cylinder(h = 6, r = 1.5000000000);
						}
						translate(v = [0, 0, -6.0000000000]) {
							cylinder(h = 6, r = 1.8000000000);
						}
						translate(v = [0, 0, -6.0000000000]) {
							cylinder(h = 6, r = 1.5000000000);
						}
					}
					union();
				}
			}
		}
		translate(v = [0, 0, 3]) {
			hull() {
				union() {
					translate(v = [-2.0000000000, 2.0000000000, 4]) {
						cylinder(h = 42, r = 4);
					}
					translate(v = [-2.0000000000, 2.0000000000, 4]) {
						sphere(r = 4);
					}
					translate(v = [-2.0000000000, 2.0000000000, 46]) {
						sphere(r = 4);
					}
				}
				union() {
					translate(v = [2.0000000000, 2.0000000000, 4]) {
						cylinder(h = 42, r = 4);
					}
					translate(v = [2.0000000000, 2.0000000000, 4]) {
						sphere(r = 4);
					}
					translate(v = [2.0000000000, 2.0000000000, 46]) {
						sphere(r = 4);
					}
				}
				union() {
					translate(v = [-2.0000000000, -2.0000000000, 4]) {
						cylinder(h = 42, r = 4);
					}
					translate(v = [-2.0000000000, -2.0000000000, 4]) {
						sphere(r = 4);
					}
					translate(v = [-2.0000000000, -2.0000000000, 46]) {
						sphere(r = 4);
					}
				}
				union() {
					translate(v = [2.0000000000, -2.0000000000, 4]) {
						cylinder(h = 42, r = 4);
					}
					translate(v = [2.0000000000, -2.0000000000, 4]) {
						sphere(r = 4);
					}
					translate(v = [2.0000000000, -2.0000000000, 46]) {
						sphere(r = 4);
					}
				}
			}
		}
	}
}
